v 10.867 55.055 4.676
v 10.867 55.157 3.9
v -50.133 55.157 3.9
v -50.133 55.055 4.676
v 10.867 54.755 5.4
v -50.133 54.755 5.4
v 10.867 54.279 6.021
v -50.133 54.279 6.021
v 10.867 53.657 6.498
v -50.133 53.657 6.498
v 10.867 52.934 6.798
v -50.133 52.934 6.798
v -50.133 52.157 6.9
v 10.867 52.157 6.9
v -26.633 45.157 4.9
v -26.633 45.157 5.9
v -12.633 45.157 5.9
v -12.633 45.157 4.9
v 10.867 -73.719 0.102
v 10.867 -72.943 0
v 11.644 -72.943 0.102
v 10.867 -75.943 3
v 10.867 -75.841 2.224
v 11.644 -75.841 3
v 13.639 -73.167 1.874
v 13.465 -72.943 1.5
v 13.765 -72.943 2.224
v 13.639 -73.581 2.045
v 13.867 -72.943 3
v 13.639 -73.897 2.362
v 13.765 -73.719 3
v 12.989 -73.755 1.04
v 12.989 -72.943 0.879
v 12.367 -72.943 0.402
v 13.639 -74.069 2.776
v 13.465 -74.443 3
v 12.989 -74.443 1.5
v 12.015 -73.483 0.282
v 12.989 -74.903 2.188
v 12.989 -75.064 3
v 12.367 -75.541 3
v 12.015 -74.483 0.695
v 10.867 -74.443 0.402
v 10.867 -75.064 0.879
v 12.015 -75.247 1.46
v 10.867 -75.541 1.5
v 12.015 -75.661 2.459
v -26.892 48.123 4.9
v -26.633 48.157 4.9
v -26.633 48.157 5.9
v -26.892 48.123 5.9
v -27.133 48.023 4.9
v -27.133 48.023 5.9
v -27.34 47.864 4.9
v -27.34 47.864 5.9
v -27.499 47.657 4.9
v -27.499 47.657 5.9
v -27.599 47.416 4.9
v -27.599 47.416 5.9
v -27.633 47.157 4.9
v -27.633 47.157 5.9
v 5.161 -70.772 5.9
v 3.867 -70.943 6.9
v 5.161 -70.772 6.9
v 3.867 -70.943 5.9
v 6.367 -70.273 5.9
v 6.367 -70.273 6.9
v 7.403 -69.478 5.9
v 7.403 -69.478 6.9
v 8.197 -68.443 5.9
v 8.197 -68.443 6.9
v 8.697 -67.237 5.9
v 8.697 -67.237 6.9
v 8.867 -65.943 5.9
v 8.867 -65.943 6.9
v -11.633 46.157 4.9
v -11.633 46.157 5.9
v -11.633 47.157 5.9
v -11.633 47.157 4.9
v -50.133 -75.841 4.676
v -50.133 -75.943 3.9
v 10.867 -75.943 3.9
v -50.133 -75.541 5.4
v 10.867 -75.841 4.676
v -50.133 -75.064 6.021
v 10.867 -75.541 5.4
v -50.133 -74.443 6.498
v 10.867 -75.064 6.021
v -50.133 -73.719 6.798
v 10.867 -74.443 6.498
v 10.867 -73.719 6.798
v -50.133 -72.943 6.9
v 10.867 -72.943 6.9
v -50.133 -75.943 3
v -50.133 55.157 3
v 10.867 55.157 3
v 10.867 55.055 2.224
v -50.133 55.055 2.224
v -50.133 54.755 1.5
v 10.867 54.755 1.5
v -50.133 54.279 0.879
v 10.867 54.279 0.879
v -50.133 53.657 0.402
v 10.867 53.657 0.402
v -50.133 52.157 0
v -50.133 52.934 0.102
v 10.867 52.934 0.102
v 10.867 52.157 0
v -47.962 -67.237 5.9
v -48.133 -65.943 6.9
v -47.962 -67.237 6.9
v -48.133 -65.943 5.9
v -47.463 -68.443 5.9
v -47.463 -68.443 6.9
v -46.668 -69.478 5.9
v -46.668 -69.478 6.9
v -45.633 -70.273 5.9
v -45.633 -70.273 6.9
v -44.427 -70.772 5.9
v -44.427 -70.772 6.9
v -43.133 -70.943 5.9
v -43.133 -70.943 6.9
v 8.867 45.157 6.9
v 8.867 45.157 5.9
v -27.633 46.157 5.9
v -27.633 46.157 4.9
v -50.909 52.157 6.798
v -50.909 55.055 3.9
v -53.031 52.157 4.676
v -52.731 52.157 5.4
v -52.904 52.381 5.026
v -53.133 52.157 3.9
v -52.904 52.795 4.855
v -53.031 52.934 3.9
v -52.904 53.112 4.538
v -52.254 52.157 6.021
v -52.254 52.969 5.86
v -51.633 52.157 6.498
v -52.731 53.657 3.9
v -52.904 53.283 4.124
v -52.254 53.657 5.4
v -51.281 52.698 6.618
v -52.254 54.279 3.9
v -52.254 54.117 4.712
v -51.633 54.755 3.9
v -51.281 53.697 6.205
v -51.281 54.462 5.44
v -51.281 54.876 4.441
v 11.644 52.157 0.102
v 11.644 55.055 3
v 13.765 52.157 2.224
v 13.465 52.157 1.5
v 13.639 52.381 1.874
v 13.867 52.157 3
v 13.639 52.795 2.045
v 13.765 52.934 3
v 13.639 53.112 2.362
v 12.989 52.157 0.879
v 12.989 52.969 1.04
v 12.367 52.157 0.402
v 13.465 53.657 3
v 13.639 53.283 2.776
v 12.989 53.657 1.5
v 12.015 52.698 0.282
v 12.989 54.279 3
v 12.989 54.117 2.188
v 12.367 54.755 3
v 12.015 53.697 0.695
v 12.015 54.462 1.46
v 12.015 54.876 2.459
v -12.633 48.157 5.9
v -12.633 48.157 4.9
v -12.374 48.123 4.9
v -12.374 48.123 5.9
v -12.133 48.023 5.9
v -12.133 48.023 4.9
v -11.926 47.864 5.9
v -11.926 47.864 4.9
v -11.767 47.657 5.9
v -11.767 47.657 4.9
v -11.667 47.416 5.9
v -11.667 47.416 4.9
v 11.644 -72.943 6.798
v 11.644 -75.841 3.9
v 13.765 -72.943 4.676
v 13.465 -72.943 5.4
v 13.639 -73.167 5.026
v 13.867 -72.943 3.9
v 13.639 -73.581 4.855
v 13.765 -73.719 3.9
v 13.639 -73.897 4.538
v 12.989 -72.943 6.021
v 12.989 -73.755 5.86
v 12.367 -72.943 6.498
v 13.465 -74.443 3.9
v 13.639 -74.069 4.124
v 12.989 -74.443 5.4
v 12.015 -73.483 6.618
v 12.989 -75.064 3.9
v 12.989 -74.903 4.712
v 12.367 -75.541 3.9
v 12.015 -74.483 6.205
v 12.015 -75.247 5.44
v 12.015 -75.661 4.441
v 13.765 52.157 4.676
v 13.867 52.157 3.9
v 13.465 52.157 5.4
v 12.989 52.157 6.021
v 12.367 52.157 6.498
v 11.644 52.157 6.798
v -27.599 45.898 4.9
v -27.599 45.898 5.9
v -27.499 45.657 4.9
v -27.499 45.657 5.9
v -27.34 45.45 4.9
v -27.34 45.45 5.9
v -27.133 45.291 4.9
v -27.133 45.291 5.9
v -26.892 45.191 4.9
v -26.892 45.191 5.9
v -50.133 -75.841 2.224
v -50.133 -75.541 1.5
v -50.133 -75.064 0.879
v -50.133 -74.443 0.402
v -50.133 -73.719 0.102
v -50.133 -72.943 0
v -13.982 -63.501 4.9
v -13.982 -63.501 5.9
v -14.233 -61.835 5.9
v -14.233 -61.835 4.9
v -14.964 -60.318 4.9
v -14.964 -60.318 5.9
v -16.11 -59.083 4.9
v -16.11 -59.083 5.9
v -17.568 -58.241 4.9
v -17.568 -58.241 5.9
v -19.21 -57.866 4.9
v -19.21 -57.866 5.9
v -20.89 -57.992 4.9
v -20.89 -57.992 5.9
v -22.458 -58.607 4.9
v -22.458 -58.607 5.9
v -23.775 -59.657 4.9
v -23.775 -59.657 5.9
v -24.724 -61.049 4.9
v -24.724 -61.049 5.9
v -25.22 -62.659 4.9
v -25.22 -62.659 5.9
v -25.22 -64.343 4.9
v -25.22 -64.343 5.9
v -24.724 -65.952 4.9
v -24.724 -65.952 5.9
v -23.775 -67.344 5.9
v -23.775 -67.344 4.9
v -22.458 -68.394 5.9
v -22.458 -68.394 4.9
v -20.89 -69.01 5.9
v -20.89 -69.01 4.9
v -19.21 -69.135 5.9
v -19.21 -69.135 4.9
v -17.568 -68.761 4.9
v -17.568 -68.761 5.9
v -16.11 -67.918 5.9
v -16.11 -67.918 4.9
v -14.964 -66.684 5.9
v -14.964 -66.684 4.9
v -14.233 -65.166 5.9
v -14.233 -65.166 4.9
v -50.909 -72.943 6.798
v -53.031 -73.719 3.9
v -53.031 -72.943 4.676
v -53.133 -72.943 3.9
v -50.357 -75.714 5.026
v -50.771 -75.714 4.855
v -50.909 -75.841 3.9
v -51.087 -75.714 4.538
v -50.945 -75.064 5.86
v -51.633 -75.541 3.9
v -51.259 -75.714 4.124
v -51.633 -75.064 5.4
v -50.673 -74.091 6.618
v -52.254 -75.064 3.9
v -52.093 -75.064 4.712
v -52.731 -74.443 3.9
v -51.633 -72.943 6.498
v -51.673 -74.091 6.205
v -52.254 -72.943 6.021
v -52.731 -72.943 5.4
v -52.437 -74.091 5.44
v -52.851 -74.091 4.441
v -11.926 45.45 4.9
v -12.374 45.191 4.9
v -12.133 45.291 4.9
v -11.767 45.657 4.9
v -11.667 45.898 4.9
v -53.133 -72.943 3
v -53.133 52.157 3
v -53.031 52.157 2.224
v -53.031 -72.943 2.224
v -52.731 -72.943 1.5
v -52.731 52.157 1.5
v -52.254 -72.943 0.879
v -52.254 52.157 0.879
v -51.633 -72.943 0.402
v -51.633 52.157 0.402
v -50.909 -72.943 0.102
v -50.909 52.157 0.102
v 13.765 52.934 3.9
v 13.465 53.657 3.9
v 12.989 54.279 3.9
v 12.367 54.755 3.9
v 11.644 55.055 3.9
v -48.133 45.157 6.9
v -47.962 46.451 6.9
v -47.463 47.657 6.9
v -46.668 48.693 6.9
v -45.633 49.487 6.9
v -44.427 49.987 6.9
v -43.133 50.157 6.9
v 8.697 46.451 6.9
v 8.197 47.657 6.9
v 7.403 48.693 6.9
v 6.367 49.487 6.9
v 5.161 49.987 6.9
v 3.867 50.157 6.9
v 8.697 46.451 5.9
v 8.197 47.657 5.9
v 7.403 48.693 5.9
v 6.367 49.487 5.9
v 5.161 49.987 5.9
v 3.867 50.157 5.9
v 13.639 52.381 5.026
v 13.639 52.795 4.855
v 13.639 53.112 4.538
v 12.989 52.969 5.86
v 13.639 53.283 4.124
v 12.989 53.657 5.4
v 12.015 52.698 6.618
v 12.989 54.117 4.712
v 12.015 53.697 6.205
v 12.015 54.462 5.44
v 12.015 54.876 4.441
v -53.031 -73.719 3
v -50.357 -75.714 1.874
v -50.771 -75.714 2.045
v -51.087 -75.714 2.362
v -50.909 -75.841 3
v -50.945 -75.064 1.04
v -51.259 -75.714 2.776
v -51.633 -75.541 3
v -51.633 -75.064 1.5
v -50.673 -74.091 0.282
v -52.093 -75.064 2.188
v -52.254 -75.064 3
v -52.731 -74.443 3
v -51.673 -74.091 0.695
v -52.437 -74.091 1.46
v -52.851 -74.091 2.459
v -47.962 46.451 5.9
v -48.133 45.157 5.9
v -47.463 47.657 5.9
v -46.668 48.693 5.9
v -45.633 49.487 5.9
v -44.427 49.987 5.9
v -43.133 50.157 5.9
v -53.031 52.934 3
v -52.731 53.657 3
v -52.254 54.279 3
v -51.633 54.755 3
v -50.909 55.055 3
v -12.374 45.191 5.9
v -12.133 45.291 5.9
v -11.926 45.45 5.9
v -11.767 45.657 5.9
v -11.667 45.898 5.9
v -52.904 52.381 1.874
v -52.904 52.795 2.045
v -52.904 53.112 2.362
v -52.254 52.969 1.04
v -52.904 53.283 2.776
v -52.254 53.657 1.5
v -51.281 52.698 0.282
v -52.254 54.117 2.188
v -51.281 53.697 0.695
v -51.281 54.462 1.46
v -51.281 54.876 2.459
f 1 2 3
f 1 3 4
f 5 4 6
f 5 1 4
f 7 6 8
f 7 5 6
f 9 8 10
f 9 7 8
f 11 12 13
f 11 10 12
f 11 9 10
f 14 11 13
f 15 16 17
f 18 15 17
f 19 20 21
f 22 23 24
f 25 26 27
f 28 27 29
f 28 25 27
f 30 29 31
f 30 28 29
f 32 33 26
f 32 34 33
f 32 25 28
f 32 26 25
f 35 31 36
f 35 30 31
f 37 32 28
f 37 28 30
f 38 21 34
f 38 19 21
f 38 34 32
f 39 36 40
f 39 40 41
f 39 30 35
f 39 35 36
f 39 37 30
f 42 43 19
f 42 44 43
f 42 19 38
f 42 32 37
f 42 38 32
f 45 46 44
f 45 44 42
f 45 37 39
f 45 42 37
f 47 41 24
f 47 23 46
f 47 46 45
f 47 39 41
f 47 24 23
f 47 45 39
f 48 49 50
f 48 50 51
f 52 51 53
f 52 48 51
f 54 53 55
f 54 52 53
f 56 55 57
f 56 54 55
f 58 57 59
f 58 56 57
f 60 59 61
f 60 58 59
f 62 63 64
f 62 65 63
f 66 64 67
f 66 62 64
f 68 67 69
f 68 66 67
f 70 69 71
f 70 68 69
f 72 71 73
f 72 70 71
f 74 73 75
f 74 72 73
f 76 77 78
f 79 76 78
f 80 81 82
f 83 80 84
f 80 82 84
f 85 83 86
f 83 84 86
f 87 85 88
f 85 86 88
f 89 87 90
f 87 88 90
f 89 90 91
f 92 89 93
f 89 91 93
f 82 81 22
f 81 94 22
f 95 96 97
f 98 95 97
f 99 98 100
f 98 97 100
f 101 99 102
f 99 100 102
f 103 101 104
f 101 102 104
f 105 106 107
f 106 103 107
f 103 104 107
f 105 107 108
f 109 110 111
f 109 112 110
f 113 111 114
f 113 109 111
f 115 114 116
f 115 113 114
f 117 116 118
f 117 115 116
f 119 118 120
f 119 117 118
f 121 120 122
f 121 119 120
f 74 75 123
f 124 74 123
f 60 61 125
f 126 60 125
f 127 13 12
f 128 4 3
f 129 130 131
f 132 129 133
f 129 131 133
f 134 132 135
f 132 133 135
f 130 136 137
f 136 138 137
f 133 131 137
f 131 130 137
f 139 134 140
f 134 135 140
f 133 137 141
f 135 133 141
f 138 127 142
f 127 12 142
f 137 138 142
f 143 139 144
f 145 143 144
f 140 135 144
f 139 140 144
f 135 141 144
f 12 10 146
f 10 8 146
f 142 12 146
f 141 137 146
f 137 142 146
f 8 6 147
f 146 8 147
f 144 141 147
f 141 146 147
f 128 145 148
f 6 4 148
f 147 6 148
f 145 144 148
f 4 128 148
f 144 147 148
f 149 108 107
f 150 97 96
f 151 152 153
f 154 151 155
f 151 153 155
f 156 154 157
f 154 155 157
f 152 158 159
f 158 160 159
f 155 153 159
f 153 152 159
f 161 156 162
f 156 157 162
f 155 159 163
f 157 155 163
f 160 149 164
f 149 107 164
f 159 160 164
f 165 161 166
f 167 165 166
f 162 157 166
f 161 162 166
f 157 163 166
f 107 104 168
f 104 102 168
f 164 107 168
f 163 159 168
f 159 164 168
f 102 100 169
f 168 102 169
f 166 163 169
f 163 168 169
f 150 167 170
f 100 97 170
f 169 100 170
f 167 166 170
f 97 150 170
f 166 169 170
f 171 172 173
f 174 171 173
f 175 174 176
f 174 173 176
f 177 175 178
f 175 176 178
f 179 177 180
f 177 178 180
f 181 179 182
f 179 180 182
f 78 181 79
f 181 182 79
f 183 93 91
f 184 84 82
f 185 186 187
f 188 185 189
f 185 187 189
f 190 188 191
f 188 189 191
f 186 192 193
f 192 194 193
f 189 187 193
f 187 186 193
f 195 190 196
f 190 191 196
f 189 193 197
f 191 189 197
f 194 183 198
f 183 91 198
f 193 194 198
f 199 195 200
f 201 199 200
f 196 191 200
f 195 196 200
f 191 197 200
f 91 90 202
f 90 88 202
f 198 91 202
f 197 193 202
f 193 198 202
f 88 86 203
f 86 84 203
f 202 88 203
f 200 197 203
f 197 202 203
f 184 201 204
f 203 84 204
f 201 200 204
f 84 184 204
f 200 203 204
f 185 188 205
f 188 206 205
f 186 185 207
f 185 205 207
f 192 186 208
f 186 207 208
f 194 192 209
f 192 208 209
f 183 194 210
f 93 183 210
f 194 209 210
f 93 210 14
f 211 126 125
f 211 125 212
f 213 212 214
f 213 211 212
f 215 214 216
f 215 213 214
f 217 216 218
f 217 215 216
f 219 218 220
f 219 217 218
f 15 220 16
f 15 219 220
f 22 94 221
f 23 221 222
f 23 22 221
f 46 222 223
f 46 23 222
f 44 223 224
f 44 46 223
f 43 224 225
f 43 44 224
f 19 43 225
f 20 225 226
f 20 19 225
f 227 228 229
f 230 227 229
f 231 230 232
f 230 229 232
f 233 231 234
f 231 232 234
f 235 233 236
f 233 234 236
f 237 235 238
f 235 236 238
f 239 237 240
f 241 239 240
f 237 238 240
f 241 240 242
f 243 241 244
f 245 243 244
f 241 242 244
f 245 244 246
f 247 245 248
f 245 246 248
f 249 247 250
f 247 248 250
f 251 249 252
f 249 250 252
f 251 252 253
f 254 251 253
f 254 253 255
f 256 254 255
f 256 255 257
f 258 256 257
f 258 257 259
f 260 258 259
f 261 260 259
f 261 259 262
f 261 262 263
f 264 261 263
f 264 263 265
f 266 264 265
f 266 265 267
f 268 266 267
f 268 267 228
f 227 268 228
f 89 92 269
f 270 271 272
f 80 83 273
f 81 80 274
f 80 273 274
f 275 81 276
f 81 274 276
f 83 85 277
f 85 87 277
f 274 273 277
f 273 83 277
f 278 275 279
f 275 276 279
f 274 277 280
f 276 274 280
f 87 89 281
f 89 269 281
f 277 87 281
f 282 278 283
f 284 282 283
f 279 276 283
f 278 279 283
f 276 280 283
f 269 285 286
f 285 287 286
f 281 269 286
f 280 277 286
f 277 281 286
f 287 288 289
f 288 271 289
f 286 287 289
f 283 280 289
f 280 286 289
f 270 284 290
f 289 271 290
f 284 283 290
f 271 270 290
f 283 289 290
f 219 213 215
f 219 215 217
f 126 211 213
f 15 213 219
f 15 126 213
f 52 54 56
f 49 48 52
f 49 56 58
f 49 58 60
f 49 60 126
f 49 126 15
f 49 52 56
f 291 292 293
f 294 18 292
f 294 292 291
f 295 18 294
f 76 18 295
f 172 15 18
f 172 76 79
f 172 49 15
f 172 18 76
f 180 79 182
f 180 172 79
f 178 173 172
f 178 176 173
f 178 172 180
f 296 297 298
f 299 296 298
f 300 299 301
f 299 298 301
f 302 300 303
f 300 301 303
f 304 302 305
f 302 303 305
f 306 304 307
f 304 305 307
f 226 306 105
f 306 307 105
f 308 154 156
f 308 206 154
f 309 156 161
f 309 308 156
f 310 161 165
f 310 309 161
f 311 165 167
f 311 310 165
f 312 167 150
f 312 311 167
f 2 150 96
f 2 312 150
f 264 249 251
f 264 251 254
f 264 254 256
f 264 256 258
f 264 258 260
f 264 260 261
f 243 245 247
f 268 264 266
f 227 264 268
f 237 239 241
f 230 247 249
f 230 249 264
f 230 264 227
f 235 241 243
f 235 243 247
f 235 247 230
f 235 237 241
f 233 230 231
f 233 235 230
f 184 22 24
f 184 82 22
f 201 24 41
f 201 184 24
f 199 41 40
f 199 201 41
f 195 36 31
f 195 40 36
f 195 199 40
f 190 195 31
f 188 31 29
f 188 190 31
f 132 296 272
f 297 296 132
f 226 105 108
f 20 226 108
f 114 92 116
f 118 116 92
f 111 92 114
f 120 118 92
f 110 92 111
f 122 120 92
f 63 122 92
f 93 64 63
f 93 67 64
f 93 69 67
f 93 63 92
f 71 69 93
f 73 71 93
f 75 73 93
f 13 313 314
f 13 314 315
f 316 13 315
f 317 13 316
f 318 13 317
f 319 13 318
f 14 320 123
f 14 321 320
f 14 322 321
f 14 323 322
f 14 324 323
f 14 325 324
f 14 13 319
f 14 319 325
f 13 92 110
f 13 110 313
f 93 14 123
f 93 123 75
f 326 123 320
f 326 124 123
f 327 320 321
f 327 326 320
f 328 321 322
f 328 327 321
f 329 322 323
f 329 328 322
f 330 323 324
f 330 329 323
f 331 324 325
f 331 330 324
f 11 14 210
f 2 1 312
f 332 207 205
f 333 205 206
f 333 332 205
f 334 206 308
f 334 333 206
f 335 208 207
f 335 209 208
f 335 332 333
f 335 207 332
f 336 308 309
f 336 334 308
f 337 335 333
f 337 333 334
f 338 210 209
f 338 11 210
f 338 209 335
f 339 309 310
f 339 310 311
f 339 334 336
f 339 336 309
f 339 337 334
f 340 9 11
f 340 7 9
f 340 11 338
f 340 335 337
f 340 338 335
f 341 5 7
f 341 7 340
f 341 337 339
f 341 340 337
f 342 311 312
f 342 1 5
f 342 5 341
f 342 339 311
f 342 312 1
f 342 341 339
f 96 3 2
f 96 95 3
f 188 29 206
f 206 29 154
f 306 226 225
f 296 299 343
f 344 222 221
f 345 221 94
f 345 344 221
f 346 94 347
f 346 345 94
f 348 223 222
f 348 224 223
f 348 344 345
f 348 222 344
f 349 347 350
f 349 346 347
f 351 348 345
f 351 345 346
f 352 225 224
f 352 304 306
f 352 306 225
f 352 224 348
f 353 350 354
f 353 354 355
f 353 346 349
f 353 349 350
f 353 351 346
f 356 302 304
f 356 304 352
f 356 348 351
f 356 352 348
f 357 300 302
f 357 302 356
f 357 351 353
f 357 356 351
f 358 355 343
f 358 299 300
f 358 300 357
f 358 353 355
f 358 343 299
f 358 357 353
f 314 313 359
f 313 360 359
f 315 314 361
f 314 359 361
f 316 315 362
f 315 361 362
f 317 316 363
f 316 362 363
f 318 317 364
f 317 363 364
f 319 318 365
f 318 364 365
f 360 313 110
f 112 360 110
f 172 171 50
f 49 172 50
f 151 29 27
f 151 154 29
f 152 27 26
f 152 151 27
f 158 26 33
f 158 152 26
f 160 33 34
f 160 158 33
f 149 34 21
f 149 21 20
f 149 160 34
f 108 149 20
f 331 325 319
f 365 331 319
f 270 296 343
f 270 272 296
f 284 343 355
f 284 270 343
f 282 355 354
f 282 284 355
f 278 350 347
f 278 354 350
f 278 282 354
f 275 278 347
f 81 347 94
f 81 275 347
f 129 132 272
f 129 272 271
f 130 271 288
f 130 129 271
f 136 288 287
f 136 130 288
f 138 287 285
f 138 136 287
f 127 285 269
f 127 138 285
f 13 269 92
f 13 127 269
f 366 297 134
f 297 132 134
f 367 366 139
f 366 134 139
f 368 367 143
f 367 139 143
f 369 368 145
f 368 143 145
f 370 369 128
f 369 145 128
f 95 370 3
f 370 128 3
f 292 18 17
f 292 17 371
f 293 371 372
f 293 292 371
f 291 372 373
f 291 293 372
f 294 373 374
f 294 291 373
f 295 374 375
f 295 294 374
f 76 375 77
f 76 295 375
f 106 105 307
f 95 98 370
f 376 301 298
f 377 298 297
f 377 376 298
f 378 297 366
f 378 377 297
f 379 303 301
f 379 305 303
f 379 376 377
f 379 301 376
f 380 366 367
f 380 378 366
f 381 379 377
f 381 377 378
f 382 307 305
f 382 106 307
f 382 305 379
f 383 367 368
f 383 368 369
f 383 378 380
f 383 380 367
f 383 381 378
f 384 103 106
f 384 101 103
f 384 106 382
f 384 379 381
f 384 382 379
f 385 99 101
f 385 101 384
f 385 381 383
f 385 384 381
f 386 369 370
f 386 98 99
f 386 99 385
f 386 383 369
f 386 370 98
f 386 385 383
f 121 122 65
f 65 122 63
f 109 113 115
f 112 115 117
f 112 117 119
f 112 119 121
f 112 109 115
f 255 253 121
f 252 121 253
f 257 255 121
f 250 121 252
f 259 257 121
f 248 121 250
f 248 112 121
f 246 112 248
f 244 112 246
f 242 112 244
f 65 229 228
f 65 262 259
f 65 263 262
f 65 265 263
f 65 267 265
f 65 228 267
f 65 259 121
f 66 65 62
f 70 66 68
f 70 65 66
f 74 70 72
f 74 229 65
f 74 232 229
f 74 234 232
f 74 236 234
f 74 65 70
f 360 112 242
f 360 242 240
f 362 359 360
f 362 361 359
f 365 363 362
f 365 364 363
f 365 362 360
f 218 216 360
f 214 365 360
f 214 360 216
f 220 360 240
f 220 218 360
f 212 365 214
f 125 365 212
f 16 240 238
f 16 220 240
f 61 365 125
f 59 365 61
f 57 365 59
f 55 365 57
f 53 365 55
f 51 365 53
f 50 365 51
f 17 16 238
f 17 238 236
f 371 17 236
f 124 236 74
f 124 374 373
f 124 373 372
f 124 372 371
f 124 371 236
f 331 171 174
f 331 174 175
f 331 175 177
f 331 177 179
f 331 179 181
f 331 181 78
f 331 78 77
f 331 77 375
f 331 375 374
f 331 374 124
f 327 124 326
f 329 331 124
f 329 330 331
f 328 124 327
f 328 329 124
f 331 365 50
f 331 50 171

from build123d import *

# Parameters (mm, degrees)
F0_W     = 67
F0_H     = 131.1
F1_DEPTH = 6.9
F2_R     = 3
F3_R     = 5.65049
F4_DEPTH = 2
F5_R     = 1
F7_DEPTH = 1
F8_R     = 5


with BuildPart() as f1:
    # F0 (on Top) → F1 (new body)
    with BuildSketch(Plane.XY):
        with Locations((-19.632723, -10.392761)):
            Rectangle(F0_W, F0_H)
    extrude(amount=F1_DEPTH)

    # F2
    f2_edges = [f1.edges().sort_by_distance(p)[0] for p in [
        (-19.632723, 55.157239, 6.9),
        (-53.132723, -10.392761, 6.9),
        (-19.632723, -75.942761, 6.9),
        (13.867277, -10.392761, 6.9),
        (-19.632723, 55.157239, 0),
        (-53.132723, -10.392761, 0),
        (-19.632723, -75.942761, 0),
        (13.867277, -10.392761, 0),
        (13.867277, -75.942761, 3.45),
        (-53.132723, -75.942761, 3.45),
        (13.867277, 55.157239, 3.45),
        (-53.132723, 55.157239, 3.45),
    ]]
    fillet(f2_edges, radius=F2_R)

    # F3 (on face) → F4 (cut)
    with BuildSketch(Plane.XY.offset(6.9)):
        with Locations((-19.632723, -63.500725)):
            Circle(F3_R)
        Polygon((-11.632723, 48.157239), (-19.632723, 48.157239), (-27.632723, 48.157239), (-27.632723, 45.157239), (-11.632723, 45.157239), align=None)
    extrude(amount=-F4_DEPTH, mode=Mode.SUBTRACT)

    # F5
    f5_edges = [f1.edges().sort_by_distance(p)[0] for p in [
        (-27.632723, 45.157239, 5.9),
        (-27.632723, 48.157239, 5.9),
        (-11.632723, 48.157239, 5.9),
        (-11.632723, 45.157239, 5.9),
    ]]
    fillet(f5_edges, radius=F5_R)

    # F6 (on face) → F7 (cut)
    with BuildSketch(Plane.XY.offset(6.9)):
        Polygon((-48.132723, 50.157239), (-48.132723, 49.157239), (-48.132723, -70.942761), (8.867277, -70.942761), (8.867277, 50.157239), align=None)
    extrude(amount=-F7_DEPTH, mode=Mode.SUBTRACT)

    # F8
    f8_edges = [f1.edges().sort_by_distance(p)[0] for p in [
        (-48.132723, 50.157239, 6.4),
        (8.867277, 50.157239, 6.4),
        (8.867277, -70.942761, 6.4),
        (-48.132723, -70.942761, 6.4),
    ]]
    fillet(f8_edges, radius=F8_R)


solid = f1.part
